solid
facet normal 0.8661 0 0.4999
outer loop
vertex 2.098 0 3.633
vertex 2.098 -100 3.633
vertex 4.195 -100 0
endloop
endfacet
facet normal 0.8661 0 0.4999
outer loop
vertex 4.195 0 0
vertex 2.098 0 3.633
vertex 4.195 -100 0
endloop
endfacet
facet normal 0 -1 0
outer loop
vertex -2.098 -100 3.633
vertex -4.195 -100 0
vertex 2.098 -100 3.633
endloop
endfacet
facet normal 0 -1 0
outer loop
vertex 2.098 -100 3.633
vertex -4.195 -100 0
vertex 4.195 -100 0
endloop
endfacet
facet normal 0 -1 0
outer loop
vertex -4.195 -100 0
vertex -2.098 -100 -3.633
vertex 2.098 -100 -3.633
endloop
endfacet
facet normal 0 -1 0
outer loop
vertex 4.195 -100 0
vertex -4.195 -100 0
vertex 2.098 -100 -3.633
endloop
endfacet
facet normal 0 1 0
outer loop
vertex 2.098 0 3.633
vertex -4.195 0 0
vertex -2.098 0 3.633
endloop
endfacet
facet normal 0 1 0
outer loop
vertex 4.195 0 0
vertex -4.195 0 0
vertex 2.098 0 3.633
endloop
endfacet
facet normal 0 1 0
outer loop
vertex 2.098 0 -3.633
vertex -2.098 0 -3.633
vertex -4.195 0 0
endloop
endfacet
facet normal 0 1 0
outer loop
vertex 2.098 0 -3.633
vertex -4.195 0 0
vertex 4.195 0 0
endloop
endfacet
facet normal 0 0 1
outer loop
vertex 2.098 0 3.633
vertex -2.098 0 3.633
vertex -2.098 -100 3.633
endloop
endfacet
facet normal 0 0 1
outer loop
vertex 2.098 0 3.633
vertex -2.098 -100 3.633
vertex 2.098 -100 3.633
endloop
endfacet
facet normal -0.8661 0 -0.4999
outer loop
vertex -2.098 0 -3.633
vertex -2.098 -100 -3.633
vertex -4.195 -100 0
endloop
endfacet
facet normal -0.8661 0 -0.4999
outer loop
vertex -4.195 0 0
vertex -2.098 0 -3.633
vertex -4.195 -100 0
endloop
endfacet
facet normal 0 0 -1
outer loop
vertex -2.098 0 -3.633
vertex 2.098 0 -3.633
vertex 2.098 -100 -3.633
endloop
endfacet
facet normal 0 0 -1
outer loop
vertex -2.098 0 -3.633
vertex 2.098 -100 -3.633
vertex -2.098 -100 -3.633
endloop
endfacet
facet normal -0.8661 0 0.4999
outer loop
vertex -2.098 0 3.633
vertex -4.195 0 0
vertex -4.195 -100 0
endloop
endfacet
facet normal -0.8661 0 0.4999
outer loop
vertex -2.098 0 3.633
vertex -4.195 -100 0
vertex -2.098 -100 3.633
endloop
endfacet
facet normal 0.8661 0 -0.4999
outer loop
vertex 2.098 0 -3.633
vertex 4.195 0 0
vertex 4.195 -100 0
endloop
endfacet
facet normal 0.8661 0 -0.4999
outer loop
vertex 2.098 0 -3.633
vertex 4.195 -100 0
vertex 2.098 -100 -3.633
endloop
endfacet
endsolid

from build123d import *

# Parameters (mm, degrees)
BOSS_EXTRUDE1_DEPTH = 100


with BuildPart() as part:
    # Sketch1 → Boss-Extrude1 (new body)
    with BuildSketch(Plane(origin=(0, 0, 0), x_dir=(1, 0, 0), z_dir=(0, 1, 0))):
        Polygon((2.0975, 3.632976569), (-2.0975, 3.632976569), (-4.195, 0), (-2.0975, -3.632976569), (2.0975, -3.632976569), (4.195, 0), align=None)
    extrude(amount=-BOSS_EXTRUDE1_DEPTH)


solid = part.part
